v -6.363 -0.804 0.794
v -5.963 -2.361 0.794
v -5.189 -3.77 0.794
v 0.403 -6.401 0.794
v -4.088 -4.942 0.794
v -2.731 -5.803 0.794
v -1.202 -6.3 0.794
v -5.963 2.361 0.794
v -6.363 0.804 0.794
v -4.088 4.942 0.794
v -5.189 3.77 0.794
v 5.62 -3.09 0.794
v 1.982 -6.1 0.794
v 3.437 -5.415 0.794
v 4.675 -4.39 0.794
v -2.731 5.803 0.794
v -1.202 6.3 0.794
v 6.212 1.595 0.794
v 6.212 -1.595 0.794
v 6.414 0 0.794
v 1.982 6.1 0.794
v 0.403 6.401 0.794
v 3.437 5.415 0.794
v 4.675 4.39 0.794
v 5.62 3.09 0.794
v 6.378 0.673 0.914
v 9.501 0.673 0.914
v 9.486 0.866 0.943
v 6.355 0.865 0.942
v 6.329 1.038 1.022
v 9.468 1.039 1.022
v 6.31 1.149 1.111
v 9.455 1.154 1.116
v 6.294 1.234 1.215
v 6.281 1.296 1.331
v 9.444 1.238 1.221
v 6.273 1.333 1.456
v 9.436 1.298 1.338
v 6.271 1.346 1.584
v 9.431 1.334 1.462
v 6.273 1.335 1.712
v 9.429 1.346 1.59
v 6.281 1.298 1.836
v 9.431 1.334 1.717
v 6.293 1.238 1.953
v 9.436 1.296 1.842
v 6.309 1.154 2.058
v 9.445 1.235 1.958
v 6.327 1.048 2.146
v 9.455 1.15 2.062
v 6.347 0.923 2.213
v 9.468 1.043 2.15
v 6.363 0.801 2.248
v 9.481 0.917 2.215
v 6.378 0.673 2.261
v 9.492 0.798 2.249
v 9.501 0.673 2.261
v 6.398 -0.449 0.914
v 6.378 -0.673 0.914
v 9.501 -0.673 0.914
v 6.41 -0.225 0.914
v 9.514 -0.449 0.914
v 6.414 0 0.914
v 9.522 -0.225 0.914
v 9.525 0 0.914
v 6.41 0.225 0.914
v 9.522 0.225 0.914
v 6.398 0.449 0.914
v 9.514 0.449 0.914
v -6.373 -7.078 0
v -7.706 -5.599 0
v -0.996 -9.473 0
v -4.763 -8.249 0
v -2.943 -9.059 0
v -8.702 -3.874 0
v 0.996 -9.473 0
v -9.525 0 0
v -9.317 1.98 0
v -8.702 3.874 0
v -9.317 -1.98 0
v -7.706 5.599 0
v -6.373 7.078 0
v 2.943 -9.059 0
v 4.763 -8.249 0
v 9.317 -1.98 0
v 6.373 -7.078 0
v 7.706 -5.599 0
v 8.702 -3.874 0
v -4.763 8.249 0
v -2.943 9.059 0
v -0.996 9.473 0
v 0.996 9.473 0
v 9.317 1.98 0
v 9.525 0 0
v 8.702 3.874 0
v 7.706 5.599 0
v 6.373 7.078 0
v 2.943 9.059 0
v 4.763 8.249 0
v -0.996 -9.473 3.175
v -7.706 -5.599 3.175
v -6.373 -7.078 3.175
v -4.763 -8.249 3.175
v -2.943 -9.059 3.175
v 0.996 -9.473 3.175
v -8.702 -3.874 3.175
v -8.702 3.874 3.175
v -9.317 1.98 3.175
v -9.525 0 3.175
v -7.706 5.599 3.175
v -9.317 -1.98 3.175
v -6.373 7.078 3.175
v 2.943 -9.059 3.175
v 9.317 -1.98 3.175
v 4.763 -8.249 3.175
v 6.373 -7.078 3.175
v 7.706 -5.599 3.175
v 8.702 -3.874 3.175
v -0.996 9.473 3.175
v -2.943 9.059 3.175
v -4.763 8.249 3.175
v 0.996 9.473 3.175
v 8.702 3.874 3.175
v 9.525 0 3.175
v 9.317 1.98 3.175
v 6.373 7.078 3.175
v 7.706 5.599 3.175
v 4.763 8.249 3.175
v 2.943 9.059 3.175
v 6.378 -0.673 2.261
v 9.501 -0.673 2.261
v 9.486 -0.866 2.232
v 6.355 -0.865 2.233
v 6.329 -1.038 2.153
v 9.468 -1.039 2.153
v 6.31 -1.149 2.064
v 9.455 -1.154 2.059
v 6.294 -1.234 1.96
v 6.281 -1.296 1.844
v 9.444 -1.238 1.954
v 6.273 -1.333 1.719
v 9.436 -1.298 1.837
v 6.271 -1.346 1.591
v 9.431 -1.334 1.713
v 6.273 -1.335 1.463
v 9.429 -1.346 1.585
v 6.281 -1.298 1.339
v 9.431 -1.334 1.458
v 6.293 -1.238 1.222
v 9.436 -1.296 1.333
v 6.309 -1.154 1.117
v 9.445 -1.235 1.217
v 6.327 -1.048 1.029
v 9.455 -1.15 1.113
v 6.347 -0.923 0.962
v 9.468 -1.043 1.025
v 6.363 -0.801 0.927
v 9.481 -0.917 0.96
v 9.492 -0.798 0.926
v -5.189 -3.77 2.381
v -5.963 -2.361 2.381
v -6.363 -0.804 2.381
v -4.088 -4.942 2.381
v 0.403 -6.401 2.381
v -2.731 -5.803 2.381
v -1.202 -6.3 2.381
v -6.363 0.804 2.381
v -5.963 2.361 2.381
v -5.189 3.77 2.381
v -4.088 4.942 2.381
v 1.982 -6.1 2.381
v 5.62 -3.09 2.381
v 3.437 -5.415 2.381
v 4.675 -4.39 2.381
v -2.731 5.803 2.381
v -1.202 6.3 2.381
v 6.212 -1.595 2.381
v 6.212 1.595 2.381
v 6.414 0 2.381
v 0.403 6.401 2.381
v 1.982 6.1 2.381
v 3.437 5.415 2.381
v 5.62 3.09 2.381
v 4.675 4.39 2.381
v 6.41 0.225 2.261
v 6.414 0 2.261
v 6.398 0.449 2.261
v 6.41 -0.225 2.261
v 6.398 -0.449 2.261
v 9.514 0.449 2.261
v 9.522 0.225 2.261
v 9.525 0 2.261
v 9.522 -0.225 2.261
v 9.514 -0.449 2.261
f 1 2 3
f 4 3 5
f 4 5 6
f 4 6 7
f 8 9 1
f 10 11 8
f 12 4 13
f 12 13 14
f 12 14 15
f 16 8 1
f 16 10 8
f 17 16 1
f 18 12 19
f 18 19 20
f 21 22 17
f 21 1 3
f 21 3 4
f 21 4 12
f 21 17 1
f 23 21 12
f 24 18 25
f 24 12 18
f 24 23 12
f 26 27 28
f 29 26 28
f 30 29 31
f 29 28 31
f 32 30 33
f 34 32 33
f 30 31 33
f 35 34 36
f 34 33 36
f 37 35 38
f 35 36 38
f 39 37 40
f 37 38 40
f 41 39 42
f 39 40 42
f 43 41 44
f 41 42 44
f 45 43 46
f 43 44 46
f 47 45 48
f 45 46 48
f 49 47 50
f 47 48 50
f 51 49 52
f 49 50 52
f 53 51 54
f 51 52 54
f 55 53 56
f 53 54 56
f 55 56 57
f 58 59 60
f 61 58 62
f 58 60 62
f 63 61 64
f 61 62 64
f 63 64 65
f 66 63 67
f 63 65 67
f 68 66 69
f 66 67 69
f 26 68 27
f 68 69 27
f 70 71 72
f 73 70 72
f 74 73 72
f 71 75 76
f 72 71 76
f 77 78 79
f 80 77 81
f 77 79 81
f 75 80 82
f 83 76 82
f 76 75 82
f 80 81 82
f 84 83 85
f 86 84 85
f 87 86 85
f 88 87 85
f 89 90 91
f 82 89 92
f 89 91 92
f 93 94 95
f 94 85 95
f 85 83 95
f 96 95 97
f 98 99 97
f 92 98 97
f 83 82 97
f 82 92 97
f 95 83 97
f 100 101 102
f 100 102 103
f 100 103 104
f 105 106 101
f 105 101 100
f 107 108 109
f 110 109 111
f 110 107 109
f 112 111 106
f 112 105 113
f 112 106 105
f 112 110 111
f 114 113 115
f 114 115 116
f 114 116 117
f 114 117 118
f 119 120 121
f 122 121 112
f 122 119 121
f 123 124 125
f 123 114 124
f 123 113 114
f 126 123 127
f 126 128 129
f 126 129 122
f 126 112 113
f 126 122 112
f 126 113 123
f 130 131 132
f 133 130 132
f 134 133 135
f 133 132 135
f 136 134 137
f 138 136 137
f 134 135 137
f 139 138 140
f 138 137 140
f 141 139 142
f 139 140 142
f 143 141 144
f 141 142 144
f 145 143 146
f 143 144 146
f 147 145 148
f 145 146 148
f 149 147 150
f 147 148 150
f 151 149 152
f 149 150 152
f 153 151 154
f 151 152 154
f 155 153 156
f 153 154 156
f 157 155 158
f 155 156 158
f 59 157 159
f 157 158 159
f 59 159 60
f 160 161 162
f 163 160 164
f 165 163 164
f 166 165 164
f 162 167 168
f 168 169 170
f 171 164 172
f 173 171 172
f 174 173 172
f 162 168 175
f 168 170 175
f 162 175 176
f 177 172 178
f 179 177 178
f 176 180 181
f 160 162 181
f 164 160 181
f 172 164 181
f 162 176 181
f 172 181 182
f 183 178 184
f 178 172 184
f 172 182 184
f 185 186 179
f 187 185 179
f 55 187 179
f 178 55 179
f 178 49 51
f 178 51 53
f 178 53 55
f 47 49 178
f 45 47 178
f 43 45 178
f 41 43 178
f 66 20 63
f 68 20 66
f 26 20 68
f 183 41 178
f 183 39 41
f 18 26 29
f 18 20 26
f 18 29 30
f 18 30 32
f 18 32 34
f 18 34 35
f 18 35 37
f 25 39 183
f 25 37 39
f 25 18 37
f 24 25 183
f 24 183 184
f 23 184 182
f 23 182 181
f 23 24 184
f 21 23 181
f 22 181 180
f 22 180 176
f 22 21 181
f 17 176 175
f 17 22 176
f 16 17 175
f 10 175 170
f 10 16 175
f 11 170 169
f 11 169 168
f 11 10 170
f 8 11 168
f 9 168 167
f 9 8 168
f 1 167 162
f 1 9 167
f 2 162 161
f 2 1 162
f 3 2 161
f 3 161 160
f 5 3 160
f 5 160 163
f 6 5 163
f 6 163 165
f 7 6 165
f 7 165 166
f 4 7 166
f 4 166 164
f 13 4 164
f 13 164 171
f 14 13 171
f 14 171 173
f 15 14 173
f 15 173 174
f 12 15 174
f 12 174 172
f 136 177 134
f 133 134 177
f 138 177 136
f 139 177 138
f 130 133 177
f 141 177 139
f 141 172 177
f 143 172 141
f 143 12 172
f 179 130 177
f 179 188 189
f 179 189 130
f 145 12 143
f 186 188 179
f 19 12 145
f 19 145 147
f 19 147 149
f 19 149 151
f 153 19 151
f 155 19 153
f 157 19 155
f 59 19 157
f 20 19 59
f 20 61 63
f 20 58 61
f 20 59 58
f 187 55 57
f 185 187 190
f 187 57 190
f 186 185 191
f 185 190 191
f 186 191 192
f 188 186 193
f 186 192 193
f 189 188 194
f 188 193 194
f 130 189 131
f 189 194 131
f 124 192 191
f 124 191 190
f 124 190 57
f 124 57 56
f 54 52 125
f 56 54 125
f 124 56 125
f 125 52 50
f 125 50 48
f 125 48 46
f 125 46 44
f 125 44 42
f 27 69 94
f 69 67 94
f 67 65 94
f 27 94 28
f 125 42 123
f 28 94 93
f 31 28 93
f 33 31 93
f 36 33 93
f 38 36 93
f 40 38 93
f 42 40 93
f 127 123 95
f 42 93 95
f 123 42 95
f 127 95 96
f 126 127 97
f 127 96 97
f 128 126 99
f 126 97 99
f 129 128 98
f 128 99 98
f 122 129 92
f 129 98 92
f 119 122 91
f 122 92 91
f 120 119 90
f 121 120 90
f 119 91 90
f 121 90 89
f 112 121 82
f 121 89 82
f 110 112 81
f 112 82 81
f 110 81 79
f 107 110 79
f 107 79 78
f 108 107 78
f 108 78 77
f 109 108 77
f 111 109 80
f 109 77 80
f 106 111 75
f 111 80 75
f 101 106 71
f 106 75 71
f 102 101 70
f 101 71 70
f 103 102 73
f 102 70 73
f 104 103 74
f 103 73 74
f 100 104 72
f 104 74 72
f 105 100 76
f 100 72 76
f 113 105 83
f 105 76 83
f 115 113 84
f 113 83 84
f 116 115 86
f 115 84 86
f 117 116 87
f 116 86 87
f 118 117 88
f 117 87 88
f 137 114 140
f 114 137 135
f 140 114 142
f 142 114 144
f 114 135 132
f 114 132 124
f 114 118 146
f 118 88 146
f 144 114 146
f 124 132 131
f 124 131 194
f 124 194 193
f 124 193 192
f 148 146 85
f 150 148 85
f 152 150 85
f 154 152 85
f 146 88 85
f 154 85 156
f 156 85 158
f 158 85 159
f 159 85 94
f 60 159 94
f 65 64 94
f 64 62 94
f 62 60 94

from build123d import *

# Parameters (mm, degrees)
F0_R     = 9.525
F1_DEPTH = 0.79375
F2_R     = 9.525
F2_R_2   = 6.4135
F3_DEPTH = 1.5875
F4_R     = 9.525
F5_DEPTH = 0.79375
F8_DEPTH = 12.7


with BuildPart() as f1:
    # F0 (on Top) → F1 (new body)
    with BuildSketch(Plane.XY):
        Circle(F0_R)
    extrude(amount=F1_DEPTH)

    # F2 (on face) → F3 (join)
    with BuildSketch(Plane.XY.offset(0.79375)):
        Circle(F2_R)
        Circle(F2_R_2, mode=Mode.SUBTRACT)
    extrude(amount=F3_DEPTH)

    # F4 (on face) → F5 (join)
    with BuildSketch(Plane.XY.offset(2.38125)):
        Circle(F4_R)
    extrude(amount=F5_DEPTH)

    # F7 (on offset) → F8 (cut)
    with BuildSketch(Plane.YZ.offset(9.525)):
        with BuildLine():
            Line((0.6731, 2.2606), (-0.6731, 2.2606))
            ThreePointArc((-0.6731, 2.2606), (-1.3462, 1.5875), (-0.6731, 0.9144))
            Line((-0.6731, 0.9144), (0.6731, 0.9144))
            ThreePointArc((0.6731, 0.9144), (1.3462, 1.5875), (0.6731, 2.2606))
        make_face()
    extrude(amount=-F8_DEPTH, mode=Mode.SUBTRACT)


solid = f1.part
